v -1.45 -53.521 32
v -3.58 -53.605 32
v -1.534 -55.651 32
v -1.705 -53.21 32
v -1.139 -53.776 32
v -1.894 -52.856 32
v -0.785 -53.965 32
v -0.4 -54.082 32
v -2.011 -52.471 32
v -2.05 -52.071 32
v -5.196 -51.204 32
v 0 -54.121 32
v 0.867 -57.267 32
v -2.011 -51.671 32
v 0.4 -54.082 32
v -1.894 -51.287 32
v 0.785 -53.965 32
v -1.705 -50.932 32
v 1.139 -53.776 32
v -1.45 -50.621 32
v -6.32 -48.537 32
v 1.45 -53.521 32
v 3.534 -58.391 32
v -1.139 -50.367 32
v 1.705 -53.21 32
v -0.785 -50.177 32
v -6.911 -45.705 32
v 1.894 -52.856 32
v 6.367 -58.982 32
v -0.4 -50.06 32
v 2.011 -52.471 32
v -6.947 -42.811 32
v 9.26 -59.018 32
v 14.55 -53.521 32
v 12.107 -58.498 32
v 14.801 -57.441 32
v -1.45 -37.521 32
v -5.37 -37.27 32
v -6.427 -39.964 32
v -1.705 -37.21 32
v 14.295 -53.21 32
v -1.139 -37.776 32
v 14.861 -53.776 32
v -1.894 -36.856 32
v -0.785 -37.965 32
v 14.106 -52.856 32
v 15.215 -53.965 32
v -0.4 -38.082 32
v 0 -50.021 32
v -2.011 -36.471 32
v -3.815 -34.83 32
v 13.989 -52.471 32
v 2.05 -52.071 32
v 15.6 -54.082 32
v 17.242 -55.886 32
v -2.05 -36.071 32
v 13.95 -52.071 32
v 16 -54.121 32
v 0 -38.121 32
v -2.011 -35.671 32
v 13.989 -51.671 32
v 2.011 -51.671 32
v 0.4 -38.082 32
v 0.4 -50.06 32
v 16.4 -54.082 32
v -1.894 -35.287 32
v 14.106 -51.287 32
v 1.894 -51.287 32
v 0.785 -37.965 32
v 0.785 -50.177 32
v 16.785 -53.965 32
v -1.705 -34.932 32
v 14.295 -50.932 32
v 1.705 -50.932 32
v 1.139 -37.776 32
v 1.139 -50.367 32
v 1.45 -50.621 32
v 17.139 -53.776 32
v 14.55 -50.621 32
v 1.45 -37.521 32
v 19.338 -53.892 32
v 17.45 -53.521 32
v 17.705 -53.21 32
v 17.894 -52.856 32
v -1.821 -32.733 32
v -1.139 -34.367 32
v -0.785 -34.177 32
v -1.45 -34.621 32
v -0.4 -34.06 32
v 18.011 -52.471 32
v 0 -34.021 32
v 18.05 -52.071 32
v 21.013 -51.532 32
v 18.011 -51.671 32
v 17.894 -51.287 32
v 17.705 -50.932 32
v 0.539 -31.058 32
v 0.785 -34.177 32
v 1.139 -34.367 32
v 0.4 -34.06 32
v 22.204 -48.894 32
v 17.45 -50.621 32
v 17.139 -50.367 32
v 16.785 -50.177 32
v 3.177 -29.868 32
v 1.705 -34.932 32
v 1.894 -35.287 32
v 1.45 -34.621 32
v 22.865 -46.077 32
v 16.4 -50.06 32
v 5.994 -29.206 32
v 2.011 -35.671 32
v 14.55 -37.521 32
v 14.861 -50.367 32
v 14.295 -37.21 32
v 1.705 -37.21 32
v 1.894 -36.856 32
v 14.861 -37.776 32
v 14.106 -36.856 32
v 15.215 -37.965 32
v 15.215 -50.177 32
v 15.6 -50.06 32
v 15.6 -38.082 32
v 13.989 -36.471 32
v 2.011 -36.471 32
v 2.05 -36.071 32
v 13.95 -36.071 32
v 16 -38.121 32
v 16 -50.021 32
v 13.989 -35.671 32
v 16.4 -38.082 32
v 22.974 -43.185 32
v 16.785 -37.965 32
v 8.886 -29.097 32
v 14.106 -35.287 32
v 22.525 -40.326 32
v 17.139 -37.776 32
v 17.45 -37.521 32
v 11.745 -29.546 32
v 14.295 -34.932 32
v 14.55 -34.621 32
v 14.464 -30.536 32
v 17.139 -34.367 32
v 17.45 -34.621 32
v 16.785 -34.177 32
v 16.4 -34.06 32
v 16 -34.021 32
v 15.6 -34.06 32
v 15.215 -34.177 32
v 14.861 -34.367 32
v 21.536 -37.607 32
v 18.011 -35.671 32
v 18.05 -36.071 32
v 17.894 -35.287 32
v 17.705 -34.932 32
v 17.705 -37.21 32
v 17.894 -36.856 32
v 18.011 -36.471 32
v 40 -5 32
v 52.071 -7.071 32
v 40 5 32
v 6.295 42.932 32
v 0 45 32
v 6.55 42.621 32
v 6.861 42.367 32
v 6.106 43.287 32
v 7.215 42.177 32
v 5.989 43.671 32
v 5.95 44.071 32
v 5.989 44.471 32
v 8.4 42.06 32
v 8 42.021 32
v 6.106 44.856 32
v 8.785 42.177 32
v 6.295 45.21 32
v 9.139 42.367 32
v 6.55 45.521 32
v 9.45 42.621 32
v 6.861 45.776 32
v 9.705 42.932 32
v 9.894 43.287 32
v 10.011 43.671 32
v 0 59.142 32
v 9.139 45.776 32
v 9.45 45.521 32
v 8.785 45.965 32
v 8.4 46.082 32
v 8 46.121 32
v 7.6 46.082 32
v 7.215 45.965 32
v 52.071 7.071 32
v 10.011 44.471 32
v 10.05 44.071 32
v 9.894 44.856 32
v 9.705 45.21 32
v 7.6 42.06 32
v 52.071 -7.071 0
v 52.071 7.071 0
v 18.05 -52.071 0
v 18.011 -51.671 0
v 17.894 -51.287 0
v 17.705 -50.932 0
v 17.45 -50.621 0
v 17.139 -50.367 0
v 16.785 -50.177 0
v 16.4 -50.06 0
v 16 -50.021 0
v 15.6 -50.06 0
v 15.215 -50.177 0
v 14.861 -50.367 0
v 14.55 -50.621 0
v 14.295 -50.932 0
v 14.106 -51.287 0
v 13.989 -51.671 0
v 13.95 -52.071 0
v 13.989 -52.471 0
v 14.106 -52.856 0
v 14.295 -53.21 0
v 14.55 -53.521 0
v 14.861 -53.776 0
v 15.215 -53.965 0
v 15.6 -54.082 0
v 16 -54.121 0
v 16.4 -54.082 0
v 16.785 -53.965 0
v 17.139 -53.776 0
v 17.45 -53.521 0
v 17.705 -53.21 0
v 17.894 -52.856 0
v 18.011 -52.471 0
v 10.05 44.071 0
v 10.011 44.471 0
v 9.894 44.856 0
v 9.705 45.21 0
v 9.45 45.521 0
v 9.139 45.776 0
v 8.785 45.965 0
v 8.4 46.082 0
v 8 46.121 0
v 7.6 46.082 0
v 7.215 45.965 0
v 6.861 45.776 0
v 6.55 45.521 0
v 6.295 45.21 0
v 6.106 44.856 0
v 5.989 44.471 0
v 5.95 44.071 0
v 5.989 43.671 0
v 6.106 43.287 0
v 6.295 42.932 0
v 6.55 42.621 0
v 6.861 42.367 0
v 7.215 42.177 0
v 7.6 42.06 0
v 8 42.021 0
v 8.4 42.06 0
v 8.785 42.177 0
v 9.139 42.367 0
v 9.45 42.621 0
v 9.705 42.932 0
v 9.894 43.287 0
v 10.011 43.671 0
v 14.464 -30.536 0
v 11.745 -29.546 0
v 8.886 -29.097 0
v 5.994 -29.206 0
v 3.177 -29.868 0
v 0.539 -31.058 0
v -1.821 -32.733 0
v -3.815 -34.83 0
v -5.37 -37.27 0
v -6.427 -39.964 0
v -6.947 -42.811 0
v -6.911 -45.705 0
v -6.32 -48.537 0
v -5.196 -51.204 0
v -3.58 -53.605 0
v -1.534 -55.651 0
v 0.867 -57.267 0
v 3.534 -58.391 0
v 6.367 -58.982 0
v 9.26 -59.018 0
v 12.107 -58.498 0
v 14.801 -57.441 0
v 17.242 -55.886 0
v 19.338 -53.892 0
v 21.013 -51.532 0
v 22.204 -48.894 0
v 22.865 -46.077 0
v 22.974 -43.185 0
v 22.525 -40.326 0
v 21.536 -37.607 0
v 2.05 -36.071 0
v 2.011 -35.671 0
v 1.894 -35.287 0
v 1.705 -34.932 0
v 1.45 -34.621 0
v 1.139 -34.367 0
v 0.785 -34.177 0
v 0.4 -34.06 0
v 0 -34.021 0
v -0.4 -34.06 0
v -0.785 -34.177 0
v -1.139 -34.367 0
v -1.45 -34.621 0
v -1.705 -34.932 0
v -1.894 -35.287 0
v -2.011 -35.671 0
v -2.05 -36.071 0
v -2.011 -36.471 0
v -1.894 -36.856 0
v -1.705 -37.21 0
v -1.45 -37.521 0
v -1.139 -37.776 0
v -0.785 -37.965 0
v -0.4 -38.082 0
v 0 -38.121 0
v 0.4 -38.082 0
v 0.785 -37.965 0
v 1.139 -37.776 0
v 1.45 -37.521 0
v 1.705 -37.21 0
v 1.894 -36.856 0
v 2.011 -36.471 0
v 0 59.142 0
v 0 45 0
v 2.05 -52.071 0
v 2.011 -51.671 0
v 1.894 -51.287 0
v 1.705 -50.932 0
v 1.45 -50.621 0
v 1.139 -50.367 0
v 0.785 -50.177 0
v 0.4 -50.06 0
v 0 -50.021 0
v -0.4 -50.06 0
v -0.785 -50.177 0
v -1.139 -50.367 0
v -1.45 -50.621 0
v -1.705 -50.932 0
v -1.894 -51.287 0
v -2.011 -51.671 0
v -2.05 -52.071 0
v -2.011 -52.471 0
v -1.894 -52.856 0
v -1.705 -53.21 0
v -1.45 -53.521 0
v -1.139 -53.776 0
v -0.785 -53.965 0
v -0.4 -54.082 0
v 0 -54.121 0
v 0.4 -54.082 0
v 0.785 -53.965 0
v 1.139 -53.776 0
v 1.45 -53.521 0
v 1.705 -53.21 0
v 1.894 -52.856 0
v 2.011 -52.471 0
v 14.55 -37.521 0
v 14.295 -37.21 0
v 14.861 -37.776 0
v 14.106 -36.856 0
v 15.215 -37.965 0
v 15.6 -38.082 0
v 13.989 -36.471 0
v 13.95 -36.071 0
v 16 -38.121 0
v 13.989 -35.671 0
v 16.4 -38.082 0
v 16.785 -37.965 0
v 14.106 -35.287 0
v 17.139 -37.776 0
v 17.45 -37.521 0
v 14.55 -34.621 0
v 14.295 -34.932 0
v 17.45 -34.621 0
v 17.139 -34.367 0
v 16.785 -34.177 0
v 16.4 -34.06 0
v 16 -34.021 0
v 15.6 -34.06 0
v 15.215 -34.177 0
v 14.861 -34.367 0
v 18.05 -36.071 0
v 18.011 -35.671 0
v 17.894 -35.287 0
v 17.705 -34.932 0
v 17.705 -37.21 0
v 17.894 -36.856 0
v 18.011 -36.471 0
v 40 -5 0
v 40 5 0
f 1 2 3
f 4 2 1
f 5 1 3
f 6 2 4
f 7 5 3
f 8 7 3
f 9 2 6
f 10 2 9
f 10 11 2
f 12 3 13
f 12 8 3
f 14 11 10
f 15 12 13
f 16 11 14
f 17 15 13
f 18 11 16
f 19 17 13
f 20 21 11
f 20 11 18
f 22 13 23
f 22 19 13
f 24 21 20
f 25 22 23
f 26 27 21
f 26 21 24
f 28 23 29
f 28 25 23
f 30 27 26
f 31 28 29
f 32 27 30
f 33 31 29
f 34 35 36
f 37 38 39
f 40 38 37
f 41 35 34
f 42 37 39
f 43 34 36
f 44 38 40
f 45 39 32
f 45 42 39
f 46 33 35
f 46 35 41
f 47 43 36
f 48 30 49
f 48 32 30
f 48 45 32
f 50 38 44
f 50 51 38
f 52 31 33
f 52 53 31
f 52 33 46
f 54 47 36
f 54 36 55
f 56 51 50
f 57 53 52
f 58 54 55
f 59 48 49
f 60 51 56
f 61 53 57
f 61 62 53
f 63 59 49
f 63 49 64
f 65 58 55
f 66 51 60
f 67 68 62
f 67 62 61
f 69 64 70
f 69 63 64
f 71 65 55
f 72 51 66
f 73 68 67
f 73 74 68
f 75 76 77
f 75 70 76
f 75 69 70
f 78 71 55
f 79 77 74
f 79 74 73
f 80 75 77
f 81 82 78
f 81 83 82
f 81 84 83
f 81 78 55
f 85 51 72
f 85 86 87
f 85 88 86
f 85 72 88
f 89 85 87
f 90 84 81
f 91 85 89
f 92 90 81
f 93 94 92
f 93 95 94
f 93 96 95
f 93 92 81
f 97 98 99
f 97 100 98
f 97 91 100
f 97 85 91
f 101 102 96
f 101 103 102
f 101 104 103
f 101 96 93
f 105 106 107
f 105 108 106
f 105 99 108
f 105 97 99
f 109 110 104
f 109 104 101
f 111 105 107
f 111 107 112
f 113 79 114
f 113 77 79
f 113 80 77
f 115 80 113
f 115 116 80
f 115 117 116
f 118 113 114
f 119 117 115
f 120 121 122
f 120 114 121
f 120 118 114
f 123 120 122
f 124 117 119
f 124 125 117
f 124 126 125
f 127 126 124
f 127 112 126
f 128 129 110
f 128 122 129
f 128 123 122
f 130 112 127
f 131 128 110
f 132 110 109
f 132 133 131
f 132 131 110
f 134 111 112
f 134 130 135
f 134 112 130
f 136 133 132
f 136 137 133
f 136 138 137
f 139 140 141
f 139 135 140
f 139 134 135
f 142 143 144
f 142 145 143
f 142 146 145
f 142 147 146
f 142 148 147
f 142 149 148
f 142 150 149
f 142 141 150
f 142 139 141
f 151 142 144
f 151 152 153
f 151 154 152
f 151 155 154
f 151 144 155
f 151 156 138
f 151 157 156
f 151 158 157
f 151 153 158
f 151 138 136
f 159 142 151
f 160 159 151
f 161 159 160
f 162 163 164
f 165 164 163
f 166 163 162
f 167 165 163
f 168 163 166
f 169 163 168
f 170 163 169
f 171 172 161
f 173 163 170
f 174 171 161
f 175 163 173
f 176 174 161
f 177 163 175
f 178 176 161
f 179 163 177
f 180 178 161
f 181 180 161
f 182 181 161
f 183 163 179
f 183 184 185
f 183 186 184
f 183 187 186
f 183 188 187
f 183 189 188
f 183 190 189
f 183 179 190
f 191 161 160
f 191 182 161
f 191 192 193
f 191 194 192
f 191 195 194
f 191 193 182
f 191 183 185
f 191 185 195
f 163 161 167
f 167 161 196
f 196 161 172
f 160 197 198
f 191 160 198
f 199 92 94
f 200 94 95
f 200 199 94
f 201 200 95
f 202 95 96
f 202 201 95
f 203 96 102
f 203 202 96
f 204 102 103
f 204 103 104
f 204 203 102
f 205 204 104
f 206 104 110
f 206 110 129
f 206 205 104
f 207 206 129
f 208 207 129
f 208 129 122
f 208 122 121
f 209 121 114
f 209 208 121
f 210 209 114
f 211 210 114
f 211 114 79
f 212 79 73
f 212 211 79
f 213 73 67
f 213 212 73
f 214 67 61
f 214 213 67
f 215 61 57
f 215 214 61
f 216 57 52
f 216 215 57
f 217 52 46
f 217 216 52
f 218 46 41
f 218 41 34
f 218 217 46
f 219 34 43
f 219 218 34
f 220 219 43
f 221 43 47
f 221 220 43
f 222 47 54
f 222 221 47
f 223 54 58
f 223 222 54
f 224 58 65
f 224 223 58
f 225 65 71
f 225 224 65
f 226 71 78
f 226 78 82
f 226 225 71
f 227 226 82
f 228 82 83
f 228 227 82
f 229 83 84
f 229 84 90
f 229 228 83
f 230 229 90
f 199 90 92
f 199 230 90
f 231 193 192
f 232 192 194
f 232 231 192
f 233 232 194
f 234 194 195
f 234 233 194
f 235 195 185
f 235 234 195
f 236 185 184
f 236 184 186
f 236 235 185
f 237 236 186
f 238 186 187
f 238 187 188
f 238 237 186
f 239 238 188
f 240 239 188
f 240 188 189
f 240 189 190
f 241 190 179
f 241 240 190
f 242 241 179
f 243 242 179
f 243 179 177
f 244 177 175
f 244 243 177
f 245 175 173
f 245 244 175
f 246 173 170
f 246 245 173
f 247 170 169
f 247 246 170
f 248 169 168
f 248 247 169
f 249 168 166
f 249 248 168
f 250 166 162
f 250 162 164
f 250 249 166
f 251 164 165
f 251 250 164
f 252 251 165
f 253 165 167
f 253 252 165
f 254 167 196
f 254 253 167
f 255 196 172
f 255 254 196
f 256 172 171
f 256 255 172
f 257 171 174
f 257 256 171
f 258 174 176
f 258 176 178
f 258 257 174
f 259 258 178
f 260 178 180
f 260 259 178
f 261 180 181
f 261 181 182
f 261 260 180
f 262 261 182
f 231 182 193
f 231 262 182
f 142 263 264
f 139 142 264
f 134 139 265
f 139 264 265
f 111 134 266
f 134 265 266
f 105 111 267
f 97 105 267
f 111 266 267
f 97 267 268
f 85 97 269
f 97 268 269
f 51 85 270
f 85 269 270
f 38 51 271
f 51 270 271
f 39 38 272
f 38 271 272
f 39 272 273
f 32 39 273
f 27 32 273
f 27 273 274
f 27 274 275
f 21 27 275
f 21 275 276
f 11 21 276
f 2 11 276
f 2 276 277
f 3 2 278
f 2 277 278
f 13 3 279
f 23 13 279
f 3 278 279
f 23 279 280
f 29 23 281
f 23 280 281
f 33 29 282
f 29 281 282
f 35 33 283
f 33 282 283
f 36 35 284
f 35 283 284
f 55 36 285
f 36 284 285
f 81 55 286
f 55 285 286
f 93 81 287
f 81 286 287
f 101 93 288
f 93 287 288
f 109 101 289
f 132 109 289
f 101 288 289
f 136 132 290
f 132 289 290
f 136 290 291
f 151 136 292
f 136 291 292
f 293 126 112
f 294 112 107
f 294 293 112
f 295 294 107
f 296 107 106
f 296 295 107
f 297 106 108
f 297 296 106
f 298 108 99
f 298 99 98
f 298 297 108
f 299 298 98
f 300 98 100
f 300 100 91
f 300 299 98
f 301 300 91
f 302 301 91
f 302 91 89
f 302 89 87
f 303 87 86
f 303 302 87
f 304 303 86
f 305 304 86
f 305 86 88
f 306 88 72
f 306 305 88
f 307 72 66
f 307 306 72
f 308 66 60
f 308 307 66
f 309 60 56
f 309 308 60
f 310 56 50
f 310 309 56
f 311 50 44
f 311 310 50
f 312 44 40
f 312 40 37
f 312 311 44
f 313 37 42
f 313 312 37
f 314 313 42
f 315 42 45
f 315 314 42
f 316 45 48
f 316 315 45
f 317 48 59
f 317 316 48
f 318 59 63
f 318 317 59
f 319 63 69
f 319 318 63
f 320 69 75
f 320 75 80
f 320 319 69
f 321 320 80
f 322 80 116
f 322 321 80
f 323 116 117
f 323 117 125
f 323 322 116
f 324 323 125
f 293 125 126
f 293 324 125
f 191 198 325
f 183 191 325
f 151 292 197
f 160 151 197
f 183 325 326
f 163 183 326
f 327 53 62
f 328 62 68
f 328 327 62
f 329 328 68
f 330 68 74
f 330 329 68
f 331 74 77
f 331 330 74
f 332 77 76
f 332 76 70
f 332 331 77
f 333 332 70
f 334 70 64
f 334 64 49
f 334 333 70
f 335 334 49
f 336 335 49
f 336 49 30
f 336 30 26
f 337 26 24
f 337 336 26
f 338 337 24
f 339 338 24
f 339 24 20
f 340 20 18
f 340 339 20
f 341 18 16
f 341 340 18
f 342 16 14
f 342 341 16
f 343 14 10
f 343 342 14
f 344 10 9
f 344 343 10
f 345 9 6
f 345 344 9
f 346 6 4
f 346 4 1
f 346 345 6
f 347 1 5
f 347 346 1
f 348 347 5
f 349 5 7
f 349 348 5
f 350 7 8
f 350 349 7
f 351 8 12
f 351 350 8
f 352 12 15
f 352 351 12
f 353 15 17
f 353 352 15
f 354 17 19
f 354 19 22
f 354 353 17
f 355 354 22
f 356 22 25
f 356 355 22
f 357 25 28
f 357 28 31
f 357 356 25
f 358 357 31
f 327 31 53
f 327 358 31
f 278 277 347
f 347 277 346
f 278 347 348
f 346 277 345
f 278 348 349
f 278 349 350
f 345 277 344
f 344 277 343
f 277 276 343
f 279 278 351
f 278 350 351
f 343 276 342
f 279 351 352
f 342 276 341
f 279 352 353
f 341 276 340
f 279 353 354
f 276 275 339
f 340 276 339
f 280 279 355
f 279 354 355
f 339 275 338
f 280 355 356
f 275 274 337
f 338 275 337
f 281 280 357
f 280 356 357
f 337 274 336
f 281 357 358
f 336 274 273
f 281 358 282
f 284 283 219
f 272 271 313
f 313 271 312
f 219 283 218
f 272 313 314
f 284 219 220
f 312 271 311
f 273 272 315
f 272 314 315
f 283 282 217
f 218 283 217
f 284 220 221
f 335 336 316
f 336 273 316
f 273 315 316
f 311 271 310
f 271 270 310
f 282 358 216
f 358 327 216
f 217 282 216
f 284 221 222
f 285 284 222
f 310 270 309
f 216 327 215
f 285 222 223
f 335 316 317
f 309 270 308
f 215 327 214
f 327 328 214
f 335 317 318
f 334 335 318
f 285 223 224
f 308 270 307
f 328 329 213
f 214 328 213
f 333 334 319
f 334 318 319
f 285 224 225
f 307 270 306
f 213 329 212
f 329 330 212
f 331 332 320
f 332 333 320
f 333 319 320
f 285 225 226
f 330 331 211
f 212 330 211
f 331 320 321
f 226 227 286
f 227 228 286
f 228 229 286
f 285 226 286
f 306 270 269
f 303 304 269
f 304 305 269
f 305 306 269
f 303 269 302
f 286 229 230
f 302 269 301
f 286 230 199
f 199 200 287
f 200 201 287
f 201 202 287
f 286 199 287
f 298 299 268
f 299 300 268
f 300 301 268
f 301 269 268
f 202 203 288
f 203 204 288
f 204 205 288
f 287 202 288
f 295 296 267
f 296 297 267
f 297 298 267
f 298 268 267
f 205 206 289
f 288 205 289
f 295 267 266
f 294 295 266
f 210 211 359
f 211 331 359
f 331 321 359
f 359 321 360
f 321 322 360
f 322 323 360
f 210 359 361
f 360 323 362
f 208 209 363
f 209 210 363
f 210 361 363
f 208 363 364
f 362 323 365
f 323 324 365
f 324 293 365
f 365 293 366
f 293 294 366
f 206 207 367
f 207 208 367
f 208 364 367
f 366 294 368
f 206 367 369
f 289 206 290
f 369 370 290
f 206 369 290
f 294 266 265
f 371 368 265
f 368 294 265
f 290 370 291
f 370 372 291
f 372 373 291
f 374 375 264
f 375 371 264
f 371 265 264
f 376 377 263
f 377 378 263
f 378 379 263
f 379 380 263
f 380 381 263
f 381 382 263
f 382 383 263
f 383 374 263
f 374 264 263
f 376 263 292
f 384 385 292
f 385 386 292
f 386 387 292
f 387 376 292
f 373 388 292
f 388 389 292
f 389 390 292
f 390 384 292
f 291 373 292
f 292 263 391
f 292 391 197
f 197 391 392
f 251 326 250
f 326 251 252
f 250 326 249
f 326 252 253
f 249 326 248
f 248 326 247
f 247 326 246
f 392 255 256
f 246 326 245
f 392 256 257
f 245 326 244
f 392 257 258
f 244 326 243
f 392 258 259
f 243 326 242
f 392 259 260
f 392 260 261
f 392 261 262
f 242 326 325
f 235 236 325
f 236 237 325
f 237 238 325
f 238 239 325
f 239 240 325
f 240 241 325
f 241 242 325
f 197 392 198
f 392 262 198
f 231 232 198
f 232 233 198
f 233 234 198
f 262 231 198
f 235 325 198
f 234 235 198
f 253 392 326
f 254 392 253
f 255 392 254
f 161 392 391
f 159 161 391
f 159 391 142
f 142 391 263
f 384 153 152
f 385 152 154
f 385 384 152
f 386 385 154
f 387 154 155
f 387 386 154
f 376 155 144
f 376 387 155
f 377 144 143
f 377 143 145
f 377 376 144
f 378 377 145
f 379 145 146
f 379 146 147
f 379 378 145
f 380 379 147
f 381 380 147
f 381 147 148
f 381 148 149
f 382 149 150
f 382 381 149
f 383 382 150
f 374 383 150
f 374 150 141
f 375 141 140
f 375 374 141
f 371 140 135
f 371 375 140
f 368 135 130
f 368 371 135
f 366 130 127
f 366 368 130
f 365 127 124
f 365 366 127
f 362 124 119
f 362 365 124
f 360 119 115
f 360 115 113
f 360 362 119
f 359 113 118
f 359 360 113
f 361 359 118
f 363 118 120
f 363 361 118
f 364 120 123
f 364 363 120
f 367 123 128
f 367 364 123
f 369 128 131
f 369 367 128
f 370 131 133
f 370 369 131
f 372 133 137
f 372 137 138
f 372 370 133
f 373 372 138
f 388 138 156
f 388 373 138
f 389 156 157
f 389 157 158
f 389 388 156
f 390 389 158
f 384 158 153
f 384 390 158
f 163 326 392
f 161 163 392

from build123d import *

# Parameters (mm, degrees)
SKETCH1_R           = 2.05
BOSS_EXTRUDE2_DEPTH = 32


with BuildPart() as part:
    # Sketch1 → Boss-Extrude2 (new body)
    with BuildSketch(Plane.XY):
        with BuildLine():
            Line((40, -5), (14.464466094, -30.535533906))
            ThreePointArc((14.464466094, -30.535533906), (-2.606601718, -54.67766953), (21.535533906, -37.606601718))
            Line((21.535533906, -37.606601718), (52.071067812, -7.071067812))
            Line((52.071067812, -7.071067812), (52.071067812, 7.071067812))
            Line((52.071067812, 7.071067812), (0, 59.142135624))
            Line((0, 59.142135624), (0, 45))
            Line((0, 45), (40, 5))
            Line((40, 5), (40, -5))
        make_face()
        with Locations((0, -52.071067812)):
            Circle(SKETCH1_R, mode=Mode.SUBTRACT)
        with Locations((16, -52.071067812)):
            Circle(SKETCH1_R, mode=Mode.SUBTRACT)
        with Locations((16, -36.071067812)):
            Circle(SKETCH1_R, mode=Mode.SUBTRACT)
        with Locations((0, -36.071067812)):
            Circle(SKETCH1_R, mode=Mode.SUBTRACT)
        with Locations((8, 44.071067812)):
            Circle(SKETCH1_R, mode=Mode.SUBTRACT)
    extrude(amount=BOSS_EXTRUDE2_DEPTH)


solid = part.part
